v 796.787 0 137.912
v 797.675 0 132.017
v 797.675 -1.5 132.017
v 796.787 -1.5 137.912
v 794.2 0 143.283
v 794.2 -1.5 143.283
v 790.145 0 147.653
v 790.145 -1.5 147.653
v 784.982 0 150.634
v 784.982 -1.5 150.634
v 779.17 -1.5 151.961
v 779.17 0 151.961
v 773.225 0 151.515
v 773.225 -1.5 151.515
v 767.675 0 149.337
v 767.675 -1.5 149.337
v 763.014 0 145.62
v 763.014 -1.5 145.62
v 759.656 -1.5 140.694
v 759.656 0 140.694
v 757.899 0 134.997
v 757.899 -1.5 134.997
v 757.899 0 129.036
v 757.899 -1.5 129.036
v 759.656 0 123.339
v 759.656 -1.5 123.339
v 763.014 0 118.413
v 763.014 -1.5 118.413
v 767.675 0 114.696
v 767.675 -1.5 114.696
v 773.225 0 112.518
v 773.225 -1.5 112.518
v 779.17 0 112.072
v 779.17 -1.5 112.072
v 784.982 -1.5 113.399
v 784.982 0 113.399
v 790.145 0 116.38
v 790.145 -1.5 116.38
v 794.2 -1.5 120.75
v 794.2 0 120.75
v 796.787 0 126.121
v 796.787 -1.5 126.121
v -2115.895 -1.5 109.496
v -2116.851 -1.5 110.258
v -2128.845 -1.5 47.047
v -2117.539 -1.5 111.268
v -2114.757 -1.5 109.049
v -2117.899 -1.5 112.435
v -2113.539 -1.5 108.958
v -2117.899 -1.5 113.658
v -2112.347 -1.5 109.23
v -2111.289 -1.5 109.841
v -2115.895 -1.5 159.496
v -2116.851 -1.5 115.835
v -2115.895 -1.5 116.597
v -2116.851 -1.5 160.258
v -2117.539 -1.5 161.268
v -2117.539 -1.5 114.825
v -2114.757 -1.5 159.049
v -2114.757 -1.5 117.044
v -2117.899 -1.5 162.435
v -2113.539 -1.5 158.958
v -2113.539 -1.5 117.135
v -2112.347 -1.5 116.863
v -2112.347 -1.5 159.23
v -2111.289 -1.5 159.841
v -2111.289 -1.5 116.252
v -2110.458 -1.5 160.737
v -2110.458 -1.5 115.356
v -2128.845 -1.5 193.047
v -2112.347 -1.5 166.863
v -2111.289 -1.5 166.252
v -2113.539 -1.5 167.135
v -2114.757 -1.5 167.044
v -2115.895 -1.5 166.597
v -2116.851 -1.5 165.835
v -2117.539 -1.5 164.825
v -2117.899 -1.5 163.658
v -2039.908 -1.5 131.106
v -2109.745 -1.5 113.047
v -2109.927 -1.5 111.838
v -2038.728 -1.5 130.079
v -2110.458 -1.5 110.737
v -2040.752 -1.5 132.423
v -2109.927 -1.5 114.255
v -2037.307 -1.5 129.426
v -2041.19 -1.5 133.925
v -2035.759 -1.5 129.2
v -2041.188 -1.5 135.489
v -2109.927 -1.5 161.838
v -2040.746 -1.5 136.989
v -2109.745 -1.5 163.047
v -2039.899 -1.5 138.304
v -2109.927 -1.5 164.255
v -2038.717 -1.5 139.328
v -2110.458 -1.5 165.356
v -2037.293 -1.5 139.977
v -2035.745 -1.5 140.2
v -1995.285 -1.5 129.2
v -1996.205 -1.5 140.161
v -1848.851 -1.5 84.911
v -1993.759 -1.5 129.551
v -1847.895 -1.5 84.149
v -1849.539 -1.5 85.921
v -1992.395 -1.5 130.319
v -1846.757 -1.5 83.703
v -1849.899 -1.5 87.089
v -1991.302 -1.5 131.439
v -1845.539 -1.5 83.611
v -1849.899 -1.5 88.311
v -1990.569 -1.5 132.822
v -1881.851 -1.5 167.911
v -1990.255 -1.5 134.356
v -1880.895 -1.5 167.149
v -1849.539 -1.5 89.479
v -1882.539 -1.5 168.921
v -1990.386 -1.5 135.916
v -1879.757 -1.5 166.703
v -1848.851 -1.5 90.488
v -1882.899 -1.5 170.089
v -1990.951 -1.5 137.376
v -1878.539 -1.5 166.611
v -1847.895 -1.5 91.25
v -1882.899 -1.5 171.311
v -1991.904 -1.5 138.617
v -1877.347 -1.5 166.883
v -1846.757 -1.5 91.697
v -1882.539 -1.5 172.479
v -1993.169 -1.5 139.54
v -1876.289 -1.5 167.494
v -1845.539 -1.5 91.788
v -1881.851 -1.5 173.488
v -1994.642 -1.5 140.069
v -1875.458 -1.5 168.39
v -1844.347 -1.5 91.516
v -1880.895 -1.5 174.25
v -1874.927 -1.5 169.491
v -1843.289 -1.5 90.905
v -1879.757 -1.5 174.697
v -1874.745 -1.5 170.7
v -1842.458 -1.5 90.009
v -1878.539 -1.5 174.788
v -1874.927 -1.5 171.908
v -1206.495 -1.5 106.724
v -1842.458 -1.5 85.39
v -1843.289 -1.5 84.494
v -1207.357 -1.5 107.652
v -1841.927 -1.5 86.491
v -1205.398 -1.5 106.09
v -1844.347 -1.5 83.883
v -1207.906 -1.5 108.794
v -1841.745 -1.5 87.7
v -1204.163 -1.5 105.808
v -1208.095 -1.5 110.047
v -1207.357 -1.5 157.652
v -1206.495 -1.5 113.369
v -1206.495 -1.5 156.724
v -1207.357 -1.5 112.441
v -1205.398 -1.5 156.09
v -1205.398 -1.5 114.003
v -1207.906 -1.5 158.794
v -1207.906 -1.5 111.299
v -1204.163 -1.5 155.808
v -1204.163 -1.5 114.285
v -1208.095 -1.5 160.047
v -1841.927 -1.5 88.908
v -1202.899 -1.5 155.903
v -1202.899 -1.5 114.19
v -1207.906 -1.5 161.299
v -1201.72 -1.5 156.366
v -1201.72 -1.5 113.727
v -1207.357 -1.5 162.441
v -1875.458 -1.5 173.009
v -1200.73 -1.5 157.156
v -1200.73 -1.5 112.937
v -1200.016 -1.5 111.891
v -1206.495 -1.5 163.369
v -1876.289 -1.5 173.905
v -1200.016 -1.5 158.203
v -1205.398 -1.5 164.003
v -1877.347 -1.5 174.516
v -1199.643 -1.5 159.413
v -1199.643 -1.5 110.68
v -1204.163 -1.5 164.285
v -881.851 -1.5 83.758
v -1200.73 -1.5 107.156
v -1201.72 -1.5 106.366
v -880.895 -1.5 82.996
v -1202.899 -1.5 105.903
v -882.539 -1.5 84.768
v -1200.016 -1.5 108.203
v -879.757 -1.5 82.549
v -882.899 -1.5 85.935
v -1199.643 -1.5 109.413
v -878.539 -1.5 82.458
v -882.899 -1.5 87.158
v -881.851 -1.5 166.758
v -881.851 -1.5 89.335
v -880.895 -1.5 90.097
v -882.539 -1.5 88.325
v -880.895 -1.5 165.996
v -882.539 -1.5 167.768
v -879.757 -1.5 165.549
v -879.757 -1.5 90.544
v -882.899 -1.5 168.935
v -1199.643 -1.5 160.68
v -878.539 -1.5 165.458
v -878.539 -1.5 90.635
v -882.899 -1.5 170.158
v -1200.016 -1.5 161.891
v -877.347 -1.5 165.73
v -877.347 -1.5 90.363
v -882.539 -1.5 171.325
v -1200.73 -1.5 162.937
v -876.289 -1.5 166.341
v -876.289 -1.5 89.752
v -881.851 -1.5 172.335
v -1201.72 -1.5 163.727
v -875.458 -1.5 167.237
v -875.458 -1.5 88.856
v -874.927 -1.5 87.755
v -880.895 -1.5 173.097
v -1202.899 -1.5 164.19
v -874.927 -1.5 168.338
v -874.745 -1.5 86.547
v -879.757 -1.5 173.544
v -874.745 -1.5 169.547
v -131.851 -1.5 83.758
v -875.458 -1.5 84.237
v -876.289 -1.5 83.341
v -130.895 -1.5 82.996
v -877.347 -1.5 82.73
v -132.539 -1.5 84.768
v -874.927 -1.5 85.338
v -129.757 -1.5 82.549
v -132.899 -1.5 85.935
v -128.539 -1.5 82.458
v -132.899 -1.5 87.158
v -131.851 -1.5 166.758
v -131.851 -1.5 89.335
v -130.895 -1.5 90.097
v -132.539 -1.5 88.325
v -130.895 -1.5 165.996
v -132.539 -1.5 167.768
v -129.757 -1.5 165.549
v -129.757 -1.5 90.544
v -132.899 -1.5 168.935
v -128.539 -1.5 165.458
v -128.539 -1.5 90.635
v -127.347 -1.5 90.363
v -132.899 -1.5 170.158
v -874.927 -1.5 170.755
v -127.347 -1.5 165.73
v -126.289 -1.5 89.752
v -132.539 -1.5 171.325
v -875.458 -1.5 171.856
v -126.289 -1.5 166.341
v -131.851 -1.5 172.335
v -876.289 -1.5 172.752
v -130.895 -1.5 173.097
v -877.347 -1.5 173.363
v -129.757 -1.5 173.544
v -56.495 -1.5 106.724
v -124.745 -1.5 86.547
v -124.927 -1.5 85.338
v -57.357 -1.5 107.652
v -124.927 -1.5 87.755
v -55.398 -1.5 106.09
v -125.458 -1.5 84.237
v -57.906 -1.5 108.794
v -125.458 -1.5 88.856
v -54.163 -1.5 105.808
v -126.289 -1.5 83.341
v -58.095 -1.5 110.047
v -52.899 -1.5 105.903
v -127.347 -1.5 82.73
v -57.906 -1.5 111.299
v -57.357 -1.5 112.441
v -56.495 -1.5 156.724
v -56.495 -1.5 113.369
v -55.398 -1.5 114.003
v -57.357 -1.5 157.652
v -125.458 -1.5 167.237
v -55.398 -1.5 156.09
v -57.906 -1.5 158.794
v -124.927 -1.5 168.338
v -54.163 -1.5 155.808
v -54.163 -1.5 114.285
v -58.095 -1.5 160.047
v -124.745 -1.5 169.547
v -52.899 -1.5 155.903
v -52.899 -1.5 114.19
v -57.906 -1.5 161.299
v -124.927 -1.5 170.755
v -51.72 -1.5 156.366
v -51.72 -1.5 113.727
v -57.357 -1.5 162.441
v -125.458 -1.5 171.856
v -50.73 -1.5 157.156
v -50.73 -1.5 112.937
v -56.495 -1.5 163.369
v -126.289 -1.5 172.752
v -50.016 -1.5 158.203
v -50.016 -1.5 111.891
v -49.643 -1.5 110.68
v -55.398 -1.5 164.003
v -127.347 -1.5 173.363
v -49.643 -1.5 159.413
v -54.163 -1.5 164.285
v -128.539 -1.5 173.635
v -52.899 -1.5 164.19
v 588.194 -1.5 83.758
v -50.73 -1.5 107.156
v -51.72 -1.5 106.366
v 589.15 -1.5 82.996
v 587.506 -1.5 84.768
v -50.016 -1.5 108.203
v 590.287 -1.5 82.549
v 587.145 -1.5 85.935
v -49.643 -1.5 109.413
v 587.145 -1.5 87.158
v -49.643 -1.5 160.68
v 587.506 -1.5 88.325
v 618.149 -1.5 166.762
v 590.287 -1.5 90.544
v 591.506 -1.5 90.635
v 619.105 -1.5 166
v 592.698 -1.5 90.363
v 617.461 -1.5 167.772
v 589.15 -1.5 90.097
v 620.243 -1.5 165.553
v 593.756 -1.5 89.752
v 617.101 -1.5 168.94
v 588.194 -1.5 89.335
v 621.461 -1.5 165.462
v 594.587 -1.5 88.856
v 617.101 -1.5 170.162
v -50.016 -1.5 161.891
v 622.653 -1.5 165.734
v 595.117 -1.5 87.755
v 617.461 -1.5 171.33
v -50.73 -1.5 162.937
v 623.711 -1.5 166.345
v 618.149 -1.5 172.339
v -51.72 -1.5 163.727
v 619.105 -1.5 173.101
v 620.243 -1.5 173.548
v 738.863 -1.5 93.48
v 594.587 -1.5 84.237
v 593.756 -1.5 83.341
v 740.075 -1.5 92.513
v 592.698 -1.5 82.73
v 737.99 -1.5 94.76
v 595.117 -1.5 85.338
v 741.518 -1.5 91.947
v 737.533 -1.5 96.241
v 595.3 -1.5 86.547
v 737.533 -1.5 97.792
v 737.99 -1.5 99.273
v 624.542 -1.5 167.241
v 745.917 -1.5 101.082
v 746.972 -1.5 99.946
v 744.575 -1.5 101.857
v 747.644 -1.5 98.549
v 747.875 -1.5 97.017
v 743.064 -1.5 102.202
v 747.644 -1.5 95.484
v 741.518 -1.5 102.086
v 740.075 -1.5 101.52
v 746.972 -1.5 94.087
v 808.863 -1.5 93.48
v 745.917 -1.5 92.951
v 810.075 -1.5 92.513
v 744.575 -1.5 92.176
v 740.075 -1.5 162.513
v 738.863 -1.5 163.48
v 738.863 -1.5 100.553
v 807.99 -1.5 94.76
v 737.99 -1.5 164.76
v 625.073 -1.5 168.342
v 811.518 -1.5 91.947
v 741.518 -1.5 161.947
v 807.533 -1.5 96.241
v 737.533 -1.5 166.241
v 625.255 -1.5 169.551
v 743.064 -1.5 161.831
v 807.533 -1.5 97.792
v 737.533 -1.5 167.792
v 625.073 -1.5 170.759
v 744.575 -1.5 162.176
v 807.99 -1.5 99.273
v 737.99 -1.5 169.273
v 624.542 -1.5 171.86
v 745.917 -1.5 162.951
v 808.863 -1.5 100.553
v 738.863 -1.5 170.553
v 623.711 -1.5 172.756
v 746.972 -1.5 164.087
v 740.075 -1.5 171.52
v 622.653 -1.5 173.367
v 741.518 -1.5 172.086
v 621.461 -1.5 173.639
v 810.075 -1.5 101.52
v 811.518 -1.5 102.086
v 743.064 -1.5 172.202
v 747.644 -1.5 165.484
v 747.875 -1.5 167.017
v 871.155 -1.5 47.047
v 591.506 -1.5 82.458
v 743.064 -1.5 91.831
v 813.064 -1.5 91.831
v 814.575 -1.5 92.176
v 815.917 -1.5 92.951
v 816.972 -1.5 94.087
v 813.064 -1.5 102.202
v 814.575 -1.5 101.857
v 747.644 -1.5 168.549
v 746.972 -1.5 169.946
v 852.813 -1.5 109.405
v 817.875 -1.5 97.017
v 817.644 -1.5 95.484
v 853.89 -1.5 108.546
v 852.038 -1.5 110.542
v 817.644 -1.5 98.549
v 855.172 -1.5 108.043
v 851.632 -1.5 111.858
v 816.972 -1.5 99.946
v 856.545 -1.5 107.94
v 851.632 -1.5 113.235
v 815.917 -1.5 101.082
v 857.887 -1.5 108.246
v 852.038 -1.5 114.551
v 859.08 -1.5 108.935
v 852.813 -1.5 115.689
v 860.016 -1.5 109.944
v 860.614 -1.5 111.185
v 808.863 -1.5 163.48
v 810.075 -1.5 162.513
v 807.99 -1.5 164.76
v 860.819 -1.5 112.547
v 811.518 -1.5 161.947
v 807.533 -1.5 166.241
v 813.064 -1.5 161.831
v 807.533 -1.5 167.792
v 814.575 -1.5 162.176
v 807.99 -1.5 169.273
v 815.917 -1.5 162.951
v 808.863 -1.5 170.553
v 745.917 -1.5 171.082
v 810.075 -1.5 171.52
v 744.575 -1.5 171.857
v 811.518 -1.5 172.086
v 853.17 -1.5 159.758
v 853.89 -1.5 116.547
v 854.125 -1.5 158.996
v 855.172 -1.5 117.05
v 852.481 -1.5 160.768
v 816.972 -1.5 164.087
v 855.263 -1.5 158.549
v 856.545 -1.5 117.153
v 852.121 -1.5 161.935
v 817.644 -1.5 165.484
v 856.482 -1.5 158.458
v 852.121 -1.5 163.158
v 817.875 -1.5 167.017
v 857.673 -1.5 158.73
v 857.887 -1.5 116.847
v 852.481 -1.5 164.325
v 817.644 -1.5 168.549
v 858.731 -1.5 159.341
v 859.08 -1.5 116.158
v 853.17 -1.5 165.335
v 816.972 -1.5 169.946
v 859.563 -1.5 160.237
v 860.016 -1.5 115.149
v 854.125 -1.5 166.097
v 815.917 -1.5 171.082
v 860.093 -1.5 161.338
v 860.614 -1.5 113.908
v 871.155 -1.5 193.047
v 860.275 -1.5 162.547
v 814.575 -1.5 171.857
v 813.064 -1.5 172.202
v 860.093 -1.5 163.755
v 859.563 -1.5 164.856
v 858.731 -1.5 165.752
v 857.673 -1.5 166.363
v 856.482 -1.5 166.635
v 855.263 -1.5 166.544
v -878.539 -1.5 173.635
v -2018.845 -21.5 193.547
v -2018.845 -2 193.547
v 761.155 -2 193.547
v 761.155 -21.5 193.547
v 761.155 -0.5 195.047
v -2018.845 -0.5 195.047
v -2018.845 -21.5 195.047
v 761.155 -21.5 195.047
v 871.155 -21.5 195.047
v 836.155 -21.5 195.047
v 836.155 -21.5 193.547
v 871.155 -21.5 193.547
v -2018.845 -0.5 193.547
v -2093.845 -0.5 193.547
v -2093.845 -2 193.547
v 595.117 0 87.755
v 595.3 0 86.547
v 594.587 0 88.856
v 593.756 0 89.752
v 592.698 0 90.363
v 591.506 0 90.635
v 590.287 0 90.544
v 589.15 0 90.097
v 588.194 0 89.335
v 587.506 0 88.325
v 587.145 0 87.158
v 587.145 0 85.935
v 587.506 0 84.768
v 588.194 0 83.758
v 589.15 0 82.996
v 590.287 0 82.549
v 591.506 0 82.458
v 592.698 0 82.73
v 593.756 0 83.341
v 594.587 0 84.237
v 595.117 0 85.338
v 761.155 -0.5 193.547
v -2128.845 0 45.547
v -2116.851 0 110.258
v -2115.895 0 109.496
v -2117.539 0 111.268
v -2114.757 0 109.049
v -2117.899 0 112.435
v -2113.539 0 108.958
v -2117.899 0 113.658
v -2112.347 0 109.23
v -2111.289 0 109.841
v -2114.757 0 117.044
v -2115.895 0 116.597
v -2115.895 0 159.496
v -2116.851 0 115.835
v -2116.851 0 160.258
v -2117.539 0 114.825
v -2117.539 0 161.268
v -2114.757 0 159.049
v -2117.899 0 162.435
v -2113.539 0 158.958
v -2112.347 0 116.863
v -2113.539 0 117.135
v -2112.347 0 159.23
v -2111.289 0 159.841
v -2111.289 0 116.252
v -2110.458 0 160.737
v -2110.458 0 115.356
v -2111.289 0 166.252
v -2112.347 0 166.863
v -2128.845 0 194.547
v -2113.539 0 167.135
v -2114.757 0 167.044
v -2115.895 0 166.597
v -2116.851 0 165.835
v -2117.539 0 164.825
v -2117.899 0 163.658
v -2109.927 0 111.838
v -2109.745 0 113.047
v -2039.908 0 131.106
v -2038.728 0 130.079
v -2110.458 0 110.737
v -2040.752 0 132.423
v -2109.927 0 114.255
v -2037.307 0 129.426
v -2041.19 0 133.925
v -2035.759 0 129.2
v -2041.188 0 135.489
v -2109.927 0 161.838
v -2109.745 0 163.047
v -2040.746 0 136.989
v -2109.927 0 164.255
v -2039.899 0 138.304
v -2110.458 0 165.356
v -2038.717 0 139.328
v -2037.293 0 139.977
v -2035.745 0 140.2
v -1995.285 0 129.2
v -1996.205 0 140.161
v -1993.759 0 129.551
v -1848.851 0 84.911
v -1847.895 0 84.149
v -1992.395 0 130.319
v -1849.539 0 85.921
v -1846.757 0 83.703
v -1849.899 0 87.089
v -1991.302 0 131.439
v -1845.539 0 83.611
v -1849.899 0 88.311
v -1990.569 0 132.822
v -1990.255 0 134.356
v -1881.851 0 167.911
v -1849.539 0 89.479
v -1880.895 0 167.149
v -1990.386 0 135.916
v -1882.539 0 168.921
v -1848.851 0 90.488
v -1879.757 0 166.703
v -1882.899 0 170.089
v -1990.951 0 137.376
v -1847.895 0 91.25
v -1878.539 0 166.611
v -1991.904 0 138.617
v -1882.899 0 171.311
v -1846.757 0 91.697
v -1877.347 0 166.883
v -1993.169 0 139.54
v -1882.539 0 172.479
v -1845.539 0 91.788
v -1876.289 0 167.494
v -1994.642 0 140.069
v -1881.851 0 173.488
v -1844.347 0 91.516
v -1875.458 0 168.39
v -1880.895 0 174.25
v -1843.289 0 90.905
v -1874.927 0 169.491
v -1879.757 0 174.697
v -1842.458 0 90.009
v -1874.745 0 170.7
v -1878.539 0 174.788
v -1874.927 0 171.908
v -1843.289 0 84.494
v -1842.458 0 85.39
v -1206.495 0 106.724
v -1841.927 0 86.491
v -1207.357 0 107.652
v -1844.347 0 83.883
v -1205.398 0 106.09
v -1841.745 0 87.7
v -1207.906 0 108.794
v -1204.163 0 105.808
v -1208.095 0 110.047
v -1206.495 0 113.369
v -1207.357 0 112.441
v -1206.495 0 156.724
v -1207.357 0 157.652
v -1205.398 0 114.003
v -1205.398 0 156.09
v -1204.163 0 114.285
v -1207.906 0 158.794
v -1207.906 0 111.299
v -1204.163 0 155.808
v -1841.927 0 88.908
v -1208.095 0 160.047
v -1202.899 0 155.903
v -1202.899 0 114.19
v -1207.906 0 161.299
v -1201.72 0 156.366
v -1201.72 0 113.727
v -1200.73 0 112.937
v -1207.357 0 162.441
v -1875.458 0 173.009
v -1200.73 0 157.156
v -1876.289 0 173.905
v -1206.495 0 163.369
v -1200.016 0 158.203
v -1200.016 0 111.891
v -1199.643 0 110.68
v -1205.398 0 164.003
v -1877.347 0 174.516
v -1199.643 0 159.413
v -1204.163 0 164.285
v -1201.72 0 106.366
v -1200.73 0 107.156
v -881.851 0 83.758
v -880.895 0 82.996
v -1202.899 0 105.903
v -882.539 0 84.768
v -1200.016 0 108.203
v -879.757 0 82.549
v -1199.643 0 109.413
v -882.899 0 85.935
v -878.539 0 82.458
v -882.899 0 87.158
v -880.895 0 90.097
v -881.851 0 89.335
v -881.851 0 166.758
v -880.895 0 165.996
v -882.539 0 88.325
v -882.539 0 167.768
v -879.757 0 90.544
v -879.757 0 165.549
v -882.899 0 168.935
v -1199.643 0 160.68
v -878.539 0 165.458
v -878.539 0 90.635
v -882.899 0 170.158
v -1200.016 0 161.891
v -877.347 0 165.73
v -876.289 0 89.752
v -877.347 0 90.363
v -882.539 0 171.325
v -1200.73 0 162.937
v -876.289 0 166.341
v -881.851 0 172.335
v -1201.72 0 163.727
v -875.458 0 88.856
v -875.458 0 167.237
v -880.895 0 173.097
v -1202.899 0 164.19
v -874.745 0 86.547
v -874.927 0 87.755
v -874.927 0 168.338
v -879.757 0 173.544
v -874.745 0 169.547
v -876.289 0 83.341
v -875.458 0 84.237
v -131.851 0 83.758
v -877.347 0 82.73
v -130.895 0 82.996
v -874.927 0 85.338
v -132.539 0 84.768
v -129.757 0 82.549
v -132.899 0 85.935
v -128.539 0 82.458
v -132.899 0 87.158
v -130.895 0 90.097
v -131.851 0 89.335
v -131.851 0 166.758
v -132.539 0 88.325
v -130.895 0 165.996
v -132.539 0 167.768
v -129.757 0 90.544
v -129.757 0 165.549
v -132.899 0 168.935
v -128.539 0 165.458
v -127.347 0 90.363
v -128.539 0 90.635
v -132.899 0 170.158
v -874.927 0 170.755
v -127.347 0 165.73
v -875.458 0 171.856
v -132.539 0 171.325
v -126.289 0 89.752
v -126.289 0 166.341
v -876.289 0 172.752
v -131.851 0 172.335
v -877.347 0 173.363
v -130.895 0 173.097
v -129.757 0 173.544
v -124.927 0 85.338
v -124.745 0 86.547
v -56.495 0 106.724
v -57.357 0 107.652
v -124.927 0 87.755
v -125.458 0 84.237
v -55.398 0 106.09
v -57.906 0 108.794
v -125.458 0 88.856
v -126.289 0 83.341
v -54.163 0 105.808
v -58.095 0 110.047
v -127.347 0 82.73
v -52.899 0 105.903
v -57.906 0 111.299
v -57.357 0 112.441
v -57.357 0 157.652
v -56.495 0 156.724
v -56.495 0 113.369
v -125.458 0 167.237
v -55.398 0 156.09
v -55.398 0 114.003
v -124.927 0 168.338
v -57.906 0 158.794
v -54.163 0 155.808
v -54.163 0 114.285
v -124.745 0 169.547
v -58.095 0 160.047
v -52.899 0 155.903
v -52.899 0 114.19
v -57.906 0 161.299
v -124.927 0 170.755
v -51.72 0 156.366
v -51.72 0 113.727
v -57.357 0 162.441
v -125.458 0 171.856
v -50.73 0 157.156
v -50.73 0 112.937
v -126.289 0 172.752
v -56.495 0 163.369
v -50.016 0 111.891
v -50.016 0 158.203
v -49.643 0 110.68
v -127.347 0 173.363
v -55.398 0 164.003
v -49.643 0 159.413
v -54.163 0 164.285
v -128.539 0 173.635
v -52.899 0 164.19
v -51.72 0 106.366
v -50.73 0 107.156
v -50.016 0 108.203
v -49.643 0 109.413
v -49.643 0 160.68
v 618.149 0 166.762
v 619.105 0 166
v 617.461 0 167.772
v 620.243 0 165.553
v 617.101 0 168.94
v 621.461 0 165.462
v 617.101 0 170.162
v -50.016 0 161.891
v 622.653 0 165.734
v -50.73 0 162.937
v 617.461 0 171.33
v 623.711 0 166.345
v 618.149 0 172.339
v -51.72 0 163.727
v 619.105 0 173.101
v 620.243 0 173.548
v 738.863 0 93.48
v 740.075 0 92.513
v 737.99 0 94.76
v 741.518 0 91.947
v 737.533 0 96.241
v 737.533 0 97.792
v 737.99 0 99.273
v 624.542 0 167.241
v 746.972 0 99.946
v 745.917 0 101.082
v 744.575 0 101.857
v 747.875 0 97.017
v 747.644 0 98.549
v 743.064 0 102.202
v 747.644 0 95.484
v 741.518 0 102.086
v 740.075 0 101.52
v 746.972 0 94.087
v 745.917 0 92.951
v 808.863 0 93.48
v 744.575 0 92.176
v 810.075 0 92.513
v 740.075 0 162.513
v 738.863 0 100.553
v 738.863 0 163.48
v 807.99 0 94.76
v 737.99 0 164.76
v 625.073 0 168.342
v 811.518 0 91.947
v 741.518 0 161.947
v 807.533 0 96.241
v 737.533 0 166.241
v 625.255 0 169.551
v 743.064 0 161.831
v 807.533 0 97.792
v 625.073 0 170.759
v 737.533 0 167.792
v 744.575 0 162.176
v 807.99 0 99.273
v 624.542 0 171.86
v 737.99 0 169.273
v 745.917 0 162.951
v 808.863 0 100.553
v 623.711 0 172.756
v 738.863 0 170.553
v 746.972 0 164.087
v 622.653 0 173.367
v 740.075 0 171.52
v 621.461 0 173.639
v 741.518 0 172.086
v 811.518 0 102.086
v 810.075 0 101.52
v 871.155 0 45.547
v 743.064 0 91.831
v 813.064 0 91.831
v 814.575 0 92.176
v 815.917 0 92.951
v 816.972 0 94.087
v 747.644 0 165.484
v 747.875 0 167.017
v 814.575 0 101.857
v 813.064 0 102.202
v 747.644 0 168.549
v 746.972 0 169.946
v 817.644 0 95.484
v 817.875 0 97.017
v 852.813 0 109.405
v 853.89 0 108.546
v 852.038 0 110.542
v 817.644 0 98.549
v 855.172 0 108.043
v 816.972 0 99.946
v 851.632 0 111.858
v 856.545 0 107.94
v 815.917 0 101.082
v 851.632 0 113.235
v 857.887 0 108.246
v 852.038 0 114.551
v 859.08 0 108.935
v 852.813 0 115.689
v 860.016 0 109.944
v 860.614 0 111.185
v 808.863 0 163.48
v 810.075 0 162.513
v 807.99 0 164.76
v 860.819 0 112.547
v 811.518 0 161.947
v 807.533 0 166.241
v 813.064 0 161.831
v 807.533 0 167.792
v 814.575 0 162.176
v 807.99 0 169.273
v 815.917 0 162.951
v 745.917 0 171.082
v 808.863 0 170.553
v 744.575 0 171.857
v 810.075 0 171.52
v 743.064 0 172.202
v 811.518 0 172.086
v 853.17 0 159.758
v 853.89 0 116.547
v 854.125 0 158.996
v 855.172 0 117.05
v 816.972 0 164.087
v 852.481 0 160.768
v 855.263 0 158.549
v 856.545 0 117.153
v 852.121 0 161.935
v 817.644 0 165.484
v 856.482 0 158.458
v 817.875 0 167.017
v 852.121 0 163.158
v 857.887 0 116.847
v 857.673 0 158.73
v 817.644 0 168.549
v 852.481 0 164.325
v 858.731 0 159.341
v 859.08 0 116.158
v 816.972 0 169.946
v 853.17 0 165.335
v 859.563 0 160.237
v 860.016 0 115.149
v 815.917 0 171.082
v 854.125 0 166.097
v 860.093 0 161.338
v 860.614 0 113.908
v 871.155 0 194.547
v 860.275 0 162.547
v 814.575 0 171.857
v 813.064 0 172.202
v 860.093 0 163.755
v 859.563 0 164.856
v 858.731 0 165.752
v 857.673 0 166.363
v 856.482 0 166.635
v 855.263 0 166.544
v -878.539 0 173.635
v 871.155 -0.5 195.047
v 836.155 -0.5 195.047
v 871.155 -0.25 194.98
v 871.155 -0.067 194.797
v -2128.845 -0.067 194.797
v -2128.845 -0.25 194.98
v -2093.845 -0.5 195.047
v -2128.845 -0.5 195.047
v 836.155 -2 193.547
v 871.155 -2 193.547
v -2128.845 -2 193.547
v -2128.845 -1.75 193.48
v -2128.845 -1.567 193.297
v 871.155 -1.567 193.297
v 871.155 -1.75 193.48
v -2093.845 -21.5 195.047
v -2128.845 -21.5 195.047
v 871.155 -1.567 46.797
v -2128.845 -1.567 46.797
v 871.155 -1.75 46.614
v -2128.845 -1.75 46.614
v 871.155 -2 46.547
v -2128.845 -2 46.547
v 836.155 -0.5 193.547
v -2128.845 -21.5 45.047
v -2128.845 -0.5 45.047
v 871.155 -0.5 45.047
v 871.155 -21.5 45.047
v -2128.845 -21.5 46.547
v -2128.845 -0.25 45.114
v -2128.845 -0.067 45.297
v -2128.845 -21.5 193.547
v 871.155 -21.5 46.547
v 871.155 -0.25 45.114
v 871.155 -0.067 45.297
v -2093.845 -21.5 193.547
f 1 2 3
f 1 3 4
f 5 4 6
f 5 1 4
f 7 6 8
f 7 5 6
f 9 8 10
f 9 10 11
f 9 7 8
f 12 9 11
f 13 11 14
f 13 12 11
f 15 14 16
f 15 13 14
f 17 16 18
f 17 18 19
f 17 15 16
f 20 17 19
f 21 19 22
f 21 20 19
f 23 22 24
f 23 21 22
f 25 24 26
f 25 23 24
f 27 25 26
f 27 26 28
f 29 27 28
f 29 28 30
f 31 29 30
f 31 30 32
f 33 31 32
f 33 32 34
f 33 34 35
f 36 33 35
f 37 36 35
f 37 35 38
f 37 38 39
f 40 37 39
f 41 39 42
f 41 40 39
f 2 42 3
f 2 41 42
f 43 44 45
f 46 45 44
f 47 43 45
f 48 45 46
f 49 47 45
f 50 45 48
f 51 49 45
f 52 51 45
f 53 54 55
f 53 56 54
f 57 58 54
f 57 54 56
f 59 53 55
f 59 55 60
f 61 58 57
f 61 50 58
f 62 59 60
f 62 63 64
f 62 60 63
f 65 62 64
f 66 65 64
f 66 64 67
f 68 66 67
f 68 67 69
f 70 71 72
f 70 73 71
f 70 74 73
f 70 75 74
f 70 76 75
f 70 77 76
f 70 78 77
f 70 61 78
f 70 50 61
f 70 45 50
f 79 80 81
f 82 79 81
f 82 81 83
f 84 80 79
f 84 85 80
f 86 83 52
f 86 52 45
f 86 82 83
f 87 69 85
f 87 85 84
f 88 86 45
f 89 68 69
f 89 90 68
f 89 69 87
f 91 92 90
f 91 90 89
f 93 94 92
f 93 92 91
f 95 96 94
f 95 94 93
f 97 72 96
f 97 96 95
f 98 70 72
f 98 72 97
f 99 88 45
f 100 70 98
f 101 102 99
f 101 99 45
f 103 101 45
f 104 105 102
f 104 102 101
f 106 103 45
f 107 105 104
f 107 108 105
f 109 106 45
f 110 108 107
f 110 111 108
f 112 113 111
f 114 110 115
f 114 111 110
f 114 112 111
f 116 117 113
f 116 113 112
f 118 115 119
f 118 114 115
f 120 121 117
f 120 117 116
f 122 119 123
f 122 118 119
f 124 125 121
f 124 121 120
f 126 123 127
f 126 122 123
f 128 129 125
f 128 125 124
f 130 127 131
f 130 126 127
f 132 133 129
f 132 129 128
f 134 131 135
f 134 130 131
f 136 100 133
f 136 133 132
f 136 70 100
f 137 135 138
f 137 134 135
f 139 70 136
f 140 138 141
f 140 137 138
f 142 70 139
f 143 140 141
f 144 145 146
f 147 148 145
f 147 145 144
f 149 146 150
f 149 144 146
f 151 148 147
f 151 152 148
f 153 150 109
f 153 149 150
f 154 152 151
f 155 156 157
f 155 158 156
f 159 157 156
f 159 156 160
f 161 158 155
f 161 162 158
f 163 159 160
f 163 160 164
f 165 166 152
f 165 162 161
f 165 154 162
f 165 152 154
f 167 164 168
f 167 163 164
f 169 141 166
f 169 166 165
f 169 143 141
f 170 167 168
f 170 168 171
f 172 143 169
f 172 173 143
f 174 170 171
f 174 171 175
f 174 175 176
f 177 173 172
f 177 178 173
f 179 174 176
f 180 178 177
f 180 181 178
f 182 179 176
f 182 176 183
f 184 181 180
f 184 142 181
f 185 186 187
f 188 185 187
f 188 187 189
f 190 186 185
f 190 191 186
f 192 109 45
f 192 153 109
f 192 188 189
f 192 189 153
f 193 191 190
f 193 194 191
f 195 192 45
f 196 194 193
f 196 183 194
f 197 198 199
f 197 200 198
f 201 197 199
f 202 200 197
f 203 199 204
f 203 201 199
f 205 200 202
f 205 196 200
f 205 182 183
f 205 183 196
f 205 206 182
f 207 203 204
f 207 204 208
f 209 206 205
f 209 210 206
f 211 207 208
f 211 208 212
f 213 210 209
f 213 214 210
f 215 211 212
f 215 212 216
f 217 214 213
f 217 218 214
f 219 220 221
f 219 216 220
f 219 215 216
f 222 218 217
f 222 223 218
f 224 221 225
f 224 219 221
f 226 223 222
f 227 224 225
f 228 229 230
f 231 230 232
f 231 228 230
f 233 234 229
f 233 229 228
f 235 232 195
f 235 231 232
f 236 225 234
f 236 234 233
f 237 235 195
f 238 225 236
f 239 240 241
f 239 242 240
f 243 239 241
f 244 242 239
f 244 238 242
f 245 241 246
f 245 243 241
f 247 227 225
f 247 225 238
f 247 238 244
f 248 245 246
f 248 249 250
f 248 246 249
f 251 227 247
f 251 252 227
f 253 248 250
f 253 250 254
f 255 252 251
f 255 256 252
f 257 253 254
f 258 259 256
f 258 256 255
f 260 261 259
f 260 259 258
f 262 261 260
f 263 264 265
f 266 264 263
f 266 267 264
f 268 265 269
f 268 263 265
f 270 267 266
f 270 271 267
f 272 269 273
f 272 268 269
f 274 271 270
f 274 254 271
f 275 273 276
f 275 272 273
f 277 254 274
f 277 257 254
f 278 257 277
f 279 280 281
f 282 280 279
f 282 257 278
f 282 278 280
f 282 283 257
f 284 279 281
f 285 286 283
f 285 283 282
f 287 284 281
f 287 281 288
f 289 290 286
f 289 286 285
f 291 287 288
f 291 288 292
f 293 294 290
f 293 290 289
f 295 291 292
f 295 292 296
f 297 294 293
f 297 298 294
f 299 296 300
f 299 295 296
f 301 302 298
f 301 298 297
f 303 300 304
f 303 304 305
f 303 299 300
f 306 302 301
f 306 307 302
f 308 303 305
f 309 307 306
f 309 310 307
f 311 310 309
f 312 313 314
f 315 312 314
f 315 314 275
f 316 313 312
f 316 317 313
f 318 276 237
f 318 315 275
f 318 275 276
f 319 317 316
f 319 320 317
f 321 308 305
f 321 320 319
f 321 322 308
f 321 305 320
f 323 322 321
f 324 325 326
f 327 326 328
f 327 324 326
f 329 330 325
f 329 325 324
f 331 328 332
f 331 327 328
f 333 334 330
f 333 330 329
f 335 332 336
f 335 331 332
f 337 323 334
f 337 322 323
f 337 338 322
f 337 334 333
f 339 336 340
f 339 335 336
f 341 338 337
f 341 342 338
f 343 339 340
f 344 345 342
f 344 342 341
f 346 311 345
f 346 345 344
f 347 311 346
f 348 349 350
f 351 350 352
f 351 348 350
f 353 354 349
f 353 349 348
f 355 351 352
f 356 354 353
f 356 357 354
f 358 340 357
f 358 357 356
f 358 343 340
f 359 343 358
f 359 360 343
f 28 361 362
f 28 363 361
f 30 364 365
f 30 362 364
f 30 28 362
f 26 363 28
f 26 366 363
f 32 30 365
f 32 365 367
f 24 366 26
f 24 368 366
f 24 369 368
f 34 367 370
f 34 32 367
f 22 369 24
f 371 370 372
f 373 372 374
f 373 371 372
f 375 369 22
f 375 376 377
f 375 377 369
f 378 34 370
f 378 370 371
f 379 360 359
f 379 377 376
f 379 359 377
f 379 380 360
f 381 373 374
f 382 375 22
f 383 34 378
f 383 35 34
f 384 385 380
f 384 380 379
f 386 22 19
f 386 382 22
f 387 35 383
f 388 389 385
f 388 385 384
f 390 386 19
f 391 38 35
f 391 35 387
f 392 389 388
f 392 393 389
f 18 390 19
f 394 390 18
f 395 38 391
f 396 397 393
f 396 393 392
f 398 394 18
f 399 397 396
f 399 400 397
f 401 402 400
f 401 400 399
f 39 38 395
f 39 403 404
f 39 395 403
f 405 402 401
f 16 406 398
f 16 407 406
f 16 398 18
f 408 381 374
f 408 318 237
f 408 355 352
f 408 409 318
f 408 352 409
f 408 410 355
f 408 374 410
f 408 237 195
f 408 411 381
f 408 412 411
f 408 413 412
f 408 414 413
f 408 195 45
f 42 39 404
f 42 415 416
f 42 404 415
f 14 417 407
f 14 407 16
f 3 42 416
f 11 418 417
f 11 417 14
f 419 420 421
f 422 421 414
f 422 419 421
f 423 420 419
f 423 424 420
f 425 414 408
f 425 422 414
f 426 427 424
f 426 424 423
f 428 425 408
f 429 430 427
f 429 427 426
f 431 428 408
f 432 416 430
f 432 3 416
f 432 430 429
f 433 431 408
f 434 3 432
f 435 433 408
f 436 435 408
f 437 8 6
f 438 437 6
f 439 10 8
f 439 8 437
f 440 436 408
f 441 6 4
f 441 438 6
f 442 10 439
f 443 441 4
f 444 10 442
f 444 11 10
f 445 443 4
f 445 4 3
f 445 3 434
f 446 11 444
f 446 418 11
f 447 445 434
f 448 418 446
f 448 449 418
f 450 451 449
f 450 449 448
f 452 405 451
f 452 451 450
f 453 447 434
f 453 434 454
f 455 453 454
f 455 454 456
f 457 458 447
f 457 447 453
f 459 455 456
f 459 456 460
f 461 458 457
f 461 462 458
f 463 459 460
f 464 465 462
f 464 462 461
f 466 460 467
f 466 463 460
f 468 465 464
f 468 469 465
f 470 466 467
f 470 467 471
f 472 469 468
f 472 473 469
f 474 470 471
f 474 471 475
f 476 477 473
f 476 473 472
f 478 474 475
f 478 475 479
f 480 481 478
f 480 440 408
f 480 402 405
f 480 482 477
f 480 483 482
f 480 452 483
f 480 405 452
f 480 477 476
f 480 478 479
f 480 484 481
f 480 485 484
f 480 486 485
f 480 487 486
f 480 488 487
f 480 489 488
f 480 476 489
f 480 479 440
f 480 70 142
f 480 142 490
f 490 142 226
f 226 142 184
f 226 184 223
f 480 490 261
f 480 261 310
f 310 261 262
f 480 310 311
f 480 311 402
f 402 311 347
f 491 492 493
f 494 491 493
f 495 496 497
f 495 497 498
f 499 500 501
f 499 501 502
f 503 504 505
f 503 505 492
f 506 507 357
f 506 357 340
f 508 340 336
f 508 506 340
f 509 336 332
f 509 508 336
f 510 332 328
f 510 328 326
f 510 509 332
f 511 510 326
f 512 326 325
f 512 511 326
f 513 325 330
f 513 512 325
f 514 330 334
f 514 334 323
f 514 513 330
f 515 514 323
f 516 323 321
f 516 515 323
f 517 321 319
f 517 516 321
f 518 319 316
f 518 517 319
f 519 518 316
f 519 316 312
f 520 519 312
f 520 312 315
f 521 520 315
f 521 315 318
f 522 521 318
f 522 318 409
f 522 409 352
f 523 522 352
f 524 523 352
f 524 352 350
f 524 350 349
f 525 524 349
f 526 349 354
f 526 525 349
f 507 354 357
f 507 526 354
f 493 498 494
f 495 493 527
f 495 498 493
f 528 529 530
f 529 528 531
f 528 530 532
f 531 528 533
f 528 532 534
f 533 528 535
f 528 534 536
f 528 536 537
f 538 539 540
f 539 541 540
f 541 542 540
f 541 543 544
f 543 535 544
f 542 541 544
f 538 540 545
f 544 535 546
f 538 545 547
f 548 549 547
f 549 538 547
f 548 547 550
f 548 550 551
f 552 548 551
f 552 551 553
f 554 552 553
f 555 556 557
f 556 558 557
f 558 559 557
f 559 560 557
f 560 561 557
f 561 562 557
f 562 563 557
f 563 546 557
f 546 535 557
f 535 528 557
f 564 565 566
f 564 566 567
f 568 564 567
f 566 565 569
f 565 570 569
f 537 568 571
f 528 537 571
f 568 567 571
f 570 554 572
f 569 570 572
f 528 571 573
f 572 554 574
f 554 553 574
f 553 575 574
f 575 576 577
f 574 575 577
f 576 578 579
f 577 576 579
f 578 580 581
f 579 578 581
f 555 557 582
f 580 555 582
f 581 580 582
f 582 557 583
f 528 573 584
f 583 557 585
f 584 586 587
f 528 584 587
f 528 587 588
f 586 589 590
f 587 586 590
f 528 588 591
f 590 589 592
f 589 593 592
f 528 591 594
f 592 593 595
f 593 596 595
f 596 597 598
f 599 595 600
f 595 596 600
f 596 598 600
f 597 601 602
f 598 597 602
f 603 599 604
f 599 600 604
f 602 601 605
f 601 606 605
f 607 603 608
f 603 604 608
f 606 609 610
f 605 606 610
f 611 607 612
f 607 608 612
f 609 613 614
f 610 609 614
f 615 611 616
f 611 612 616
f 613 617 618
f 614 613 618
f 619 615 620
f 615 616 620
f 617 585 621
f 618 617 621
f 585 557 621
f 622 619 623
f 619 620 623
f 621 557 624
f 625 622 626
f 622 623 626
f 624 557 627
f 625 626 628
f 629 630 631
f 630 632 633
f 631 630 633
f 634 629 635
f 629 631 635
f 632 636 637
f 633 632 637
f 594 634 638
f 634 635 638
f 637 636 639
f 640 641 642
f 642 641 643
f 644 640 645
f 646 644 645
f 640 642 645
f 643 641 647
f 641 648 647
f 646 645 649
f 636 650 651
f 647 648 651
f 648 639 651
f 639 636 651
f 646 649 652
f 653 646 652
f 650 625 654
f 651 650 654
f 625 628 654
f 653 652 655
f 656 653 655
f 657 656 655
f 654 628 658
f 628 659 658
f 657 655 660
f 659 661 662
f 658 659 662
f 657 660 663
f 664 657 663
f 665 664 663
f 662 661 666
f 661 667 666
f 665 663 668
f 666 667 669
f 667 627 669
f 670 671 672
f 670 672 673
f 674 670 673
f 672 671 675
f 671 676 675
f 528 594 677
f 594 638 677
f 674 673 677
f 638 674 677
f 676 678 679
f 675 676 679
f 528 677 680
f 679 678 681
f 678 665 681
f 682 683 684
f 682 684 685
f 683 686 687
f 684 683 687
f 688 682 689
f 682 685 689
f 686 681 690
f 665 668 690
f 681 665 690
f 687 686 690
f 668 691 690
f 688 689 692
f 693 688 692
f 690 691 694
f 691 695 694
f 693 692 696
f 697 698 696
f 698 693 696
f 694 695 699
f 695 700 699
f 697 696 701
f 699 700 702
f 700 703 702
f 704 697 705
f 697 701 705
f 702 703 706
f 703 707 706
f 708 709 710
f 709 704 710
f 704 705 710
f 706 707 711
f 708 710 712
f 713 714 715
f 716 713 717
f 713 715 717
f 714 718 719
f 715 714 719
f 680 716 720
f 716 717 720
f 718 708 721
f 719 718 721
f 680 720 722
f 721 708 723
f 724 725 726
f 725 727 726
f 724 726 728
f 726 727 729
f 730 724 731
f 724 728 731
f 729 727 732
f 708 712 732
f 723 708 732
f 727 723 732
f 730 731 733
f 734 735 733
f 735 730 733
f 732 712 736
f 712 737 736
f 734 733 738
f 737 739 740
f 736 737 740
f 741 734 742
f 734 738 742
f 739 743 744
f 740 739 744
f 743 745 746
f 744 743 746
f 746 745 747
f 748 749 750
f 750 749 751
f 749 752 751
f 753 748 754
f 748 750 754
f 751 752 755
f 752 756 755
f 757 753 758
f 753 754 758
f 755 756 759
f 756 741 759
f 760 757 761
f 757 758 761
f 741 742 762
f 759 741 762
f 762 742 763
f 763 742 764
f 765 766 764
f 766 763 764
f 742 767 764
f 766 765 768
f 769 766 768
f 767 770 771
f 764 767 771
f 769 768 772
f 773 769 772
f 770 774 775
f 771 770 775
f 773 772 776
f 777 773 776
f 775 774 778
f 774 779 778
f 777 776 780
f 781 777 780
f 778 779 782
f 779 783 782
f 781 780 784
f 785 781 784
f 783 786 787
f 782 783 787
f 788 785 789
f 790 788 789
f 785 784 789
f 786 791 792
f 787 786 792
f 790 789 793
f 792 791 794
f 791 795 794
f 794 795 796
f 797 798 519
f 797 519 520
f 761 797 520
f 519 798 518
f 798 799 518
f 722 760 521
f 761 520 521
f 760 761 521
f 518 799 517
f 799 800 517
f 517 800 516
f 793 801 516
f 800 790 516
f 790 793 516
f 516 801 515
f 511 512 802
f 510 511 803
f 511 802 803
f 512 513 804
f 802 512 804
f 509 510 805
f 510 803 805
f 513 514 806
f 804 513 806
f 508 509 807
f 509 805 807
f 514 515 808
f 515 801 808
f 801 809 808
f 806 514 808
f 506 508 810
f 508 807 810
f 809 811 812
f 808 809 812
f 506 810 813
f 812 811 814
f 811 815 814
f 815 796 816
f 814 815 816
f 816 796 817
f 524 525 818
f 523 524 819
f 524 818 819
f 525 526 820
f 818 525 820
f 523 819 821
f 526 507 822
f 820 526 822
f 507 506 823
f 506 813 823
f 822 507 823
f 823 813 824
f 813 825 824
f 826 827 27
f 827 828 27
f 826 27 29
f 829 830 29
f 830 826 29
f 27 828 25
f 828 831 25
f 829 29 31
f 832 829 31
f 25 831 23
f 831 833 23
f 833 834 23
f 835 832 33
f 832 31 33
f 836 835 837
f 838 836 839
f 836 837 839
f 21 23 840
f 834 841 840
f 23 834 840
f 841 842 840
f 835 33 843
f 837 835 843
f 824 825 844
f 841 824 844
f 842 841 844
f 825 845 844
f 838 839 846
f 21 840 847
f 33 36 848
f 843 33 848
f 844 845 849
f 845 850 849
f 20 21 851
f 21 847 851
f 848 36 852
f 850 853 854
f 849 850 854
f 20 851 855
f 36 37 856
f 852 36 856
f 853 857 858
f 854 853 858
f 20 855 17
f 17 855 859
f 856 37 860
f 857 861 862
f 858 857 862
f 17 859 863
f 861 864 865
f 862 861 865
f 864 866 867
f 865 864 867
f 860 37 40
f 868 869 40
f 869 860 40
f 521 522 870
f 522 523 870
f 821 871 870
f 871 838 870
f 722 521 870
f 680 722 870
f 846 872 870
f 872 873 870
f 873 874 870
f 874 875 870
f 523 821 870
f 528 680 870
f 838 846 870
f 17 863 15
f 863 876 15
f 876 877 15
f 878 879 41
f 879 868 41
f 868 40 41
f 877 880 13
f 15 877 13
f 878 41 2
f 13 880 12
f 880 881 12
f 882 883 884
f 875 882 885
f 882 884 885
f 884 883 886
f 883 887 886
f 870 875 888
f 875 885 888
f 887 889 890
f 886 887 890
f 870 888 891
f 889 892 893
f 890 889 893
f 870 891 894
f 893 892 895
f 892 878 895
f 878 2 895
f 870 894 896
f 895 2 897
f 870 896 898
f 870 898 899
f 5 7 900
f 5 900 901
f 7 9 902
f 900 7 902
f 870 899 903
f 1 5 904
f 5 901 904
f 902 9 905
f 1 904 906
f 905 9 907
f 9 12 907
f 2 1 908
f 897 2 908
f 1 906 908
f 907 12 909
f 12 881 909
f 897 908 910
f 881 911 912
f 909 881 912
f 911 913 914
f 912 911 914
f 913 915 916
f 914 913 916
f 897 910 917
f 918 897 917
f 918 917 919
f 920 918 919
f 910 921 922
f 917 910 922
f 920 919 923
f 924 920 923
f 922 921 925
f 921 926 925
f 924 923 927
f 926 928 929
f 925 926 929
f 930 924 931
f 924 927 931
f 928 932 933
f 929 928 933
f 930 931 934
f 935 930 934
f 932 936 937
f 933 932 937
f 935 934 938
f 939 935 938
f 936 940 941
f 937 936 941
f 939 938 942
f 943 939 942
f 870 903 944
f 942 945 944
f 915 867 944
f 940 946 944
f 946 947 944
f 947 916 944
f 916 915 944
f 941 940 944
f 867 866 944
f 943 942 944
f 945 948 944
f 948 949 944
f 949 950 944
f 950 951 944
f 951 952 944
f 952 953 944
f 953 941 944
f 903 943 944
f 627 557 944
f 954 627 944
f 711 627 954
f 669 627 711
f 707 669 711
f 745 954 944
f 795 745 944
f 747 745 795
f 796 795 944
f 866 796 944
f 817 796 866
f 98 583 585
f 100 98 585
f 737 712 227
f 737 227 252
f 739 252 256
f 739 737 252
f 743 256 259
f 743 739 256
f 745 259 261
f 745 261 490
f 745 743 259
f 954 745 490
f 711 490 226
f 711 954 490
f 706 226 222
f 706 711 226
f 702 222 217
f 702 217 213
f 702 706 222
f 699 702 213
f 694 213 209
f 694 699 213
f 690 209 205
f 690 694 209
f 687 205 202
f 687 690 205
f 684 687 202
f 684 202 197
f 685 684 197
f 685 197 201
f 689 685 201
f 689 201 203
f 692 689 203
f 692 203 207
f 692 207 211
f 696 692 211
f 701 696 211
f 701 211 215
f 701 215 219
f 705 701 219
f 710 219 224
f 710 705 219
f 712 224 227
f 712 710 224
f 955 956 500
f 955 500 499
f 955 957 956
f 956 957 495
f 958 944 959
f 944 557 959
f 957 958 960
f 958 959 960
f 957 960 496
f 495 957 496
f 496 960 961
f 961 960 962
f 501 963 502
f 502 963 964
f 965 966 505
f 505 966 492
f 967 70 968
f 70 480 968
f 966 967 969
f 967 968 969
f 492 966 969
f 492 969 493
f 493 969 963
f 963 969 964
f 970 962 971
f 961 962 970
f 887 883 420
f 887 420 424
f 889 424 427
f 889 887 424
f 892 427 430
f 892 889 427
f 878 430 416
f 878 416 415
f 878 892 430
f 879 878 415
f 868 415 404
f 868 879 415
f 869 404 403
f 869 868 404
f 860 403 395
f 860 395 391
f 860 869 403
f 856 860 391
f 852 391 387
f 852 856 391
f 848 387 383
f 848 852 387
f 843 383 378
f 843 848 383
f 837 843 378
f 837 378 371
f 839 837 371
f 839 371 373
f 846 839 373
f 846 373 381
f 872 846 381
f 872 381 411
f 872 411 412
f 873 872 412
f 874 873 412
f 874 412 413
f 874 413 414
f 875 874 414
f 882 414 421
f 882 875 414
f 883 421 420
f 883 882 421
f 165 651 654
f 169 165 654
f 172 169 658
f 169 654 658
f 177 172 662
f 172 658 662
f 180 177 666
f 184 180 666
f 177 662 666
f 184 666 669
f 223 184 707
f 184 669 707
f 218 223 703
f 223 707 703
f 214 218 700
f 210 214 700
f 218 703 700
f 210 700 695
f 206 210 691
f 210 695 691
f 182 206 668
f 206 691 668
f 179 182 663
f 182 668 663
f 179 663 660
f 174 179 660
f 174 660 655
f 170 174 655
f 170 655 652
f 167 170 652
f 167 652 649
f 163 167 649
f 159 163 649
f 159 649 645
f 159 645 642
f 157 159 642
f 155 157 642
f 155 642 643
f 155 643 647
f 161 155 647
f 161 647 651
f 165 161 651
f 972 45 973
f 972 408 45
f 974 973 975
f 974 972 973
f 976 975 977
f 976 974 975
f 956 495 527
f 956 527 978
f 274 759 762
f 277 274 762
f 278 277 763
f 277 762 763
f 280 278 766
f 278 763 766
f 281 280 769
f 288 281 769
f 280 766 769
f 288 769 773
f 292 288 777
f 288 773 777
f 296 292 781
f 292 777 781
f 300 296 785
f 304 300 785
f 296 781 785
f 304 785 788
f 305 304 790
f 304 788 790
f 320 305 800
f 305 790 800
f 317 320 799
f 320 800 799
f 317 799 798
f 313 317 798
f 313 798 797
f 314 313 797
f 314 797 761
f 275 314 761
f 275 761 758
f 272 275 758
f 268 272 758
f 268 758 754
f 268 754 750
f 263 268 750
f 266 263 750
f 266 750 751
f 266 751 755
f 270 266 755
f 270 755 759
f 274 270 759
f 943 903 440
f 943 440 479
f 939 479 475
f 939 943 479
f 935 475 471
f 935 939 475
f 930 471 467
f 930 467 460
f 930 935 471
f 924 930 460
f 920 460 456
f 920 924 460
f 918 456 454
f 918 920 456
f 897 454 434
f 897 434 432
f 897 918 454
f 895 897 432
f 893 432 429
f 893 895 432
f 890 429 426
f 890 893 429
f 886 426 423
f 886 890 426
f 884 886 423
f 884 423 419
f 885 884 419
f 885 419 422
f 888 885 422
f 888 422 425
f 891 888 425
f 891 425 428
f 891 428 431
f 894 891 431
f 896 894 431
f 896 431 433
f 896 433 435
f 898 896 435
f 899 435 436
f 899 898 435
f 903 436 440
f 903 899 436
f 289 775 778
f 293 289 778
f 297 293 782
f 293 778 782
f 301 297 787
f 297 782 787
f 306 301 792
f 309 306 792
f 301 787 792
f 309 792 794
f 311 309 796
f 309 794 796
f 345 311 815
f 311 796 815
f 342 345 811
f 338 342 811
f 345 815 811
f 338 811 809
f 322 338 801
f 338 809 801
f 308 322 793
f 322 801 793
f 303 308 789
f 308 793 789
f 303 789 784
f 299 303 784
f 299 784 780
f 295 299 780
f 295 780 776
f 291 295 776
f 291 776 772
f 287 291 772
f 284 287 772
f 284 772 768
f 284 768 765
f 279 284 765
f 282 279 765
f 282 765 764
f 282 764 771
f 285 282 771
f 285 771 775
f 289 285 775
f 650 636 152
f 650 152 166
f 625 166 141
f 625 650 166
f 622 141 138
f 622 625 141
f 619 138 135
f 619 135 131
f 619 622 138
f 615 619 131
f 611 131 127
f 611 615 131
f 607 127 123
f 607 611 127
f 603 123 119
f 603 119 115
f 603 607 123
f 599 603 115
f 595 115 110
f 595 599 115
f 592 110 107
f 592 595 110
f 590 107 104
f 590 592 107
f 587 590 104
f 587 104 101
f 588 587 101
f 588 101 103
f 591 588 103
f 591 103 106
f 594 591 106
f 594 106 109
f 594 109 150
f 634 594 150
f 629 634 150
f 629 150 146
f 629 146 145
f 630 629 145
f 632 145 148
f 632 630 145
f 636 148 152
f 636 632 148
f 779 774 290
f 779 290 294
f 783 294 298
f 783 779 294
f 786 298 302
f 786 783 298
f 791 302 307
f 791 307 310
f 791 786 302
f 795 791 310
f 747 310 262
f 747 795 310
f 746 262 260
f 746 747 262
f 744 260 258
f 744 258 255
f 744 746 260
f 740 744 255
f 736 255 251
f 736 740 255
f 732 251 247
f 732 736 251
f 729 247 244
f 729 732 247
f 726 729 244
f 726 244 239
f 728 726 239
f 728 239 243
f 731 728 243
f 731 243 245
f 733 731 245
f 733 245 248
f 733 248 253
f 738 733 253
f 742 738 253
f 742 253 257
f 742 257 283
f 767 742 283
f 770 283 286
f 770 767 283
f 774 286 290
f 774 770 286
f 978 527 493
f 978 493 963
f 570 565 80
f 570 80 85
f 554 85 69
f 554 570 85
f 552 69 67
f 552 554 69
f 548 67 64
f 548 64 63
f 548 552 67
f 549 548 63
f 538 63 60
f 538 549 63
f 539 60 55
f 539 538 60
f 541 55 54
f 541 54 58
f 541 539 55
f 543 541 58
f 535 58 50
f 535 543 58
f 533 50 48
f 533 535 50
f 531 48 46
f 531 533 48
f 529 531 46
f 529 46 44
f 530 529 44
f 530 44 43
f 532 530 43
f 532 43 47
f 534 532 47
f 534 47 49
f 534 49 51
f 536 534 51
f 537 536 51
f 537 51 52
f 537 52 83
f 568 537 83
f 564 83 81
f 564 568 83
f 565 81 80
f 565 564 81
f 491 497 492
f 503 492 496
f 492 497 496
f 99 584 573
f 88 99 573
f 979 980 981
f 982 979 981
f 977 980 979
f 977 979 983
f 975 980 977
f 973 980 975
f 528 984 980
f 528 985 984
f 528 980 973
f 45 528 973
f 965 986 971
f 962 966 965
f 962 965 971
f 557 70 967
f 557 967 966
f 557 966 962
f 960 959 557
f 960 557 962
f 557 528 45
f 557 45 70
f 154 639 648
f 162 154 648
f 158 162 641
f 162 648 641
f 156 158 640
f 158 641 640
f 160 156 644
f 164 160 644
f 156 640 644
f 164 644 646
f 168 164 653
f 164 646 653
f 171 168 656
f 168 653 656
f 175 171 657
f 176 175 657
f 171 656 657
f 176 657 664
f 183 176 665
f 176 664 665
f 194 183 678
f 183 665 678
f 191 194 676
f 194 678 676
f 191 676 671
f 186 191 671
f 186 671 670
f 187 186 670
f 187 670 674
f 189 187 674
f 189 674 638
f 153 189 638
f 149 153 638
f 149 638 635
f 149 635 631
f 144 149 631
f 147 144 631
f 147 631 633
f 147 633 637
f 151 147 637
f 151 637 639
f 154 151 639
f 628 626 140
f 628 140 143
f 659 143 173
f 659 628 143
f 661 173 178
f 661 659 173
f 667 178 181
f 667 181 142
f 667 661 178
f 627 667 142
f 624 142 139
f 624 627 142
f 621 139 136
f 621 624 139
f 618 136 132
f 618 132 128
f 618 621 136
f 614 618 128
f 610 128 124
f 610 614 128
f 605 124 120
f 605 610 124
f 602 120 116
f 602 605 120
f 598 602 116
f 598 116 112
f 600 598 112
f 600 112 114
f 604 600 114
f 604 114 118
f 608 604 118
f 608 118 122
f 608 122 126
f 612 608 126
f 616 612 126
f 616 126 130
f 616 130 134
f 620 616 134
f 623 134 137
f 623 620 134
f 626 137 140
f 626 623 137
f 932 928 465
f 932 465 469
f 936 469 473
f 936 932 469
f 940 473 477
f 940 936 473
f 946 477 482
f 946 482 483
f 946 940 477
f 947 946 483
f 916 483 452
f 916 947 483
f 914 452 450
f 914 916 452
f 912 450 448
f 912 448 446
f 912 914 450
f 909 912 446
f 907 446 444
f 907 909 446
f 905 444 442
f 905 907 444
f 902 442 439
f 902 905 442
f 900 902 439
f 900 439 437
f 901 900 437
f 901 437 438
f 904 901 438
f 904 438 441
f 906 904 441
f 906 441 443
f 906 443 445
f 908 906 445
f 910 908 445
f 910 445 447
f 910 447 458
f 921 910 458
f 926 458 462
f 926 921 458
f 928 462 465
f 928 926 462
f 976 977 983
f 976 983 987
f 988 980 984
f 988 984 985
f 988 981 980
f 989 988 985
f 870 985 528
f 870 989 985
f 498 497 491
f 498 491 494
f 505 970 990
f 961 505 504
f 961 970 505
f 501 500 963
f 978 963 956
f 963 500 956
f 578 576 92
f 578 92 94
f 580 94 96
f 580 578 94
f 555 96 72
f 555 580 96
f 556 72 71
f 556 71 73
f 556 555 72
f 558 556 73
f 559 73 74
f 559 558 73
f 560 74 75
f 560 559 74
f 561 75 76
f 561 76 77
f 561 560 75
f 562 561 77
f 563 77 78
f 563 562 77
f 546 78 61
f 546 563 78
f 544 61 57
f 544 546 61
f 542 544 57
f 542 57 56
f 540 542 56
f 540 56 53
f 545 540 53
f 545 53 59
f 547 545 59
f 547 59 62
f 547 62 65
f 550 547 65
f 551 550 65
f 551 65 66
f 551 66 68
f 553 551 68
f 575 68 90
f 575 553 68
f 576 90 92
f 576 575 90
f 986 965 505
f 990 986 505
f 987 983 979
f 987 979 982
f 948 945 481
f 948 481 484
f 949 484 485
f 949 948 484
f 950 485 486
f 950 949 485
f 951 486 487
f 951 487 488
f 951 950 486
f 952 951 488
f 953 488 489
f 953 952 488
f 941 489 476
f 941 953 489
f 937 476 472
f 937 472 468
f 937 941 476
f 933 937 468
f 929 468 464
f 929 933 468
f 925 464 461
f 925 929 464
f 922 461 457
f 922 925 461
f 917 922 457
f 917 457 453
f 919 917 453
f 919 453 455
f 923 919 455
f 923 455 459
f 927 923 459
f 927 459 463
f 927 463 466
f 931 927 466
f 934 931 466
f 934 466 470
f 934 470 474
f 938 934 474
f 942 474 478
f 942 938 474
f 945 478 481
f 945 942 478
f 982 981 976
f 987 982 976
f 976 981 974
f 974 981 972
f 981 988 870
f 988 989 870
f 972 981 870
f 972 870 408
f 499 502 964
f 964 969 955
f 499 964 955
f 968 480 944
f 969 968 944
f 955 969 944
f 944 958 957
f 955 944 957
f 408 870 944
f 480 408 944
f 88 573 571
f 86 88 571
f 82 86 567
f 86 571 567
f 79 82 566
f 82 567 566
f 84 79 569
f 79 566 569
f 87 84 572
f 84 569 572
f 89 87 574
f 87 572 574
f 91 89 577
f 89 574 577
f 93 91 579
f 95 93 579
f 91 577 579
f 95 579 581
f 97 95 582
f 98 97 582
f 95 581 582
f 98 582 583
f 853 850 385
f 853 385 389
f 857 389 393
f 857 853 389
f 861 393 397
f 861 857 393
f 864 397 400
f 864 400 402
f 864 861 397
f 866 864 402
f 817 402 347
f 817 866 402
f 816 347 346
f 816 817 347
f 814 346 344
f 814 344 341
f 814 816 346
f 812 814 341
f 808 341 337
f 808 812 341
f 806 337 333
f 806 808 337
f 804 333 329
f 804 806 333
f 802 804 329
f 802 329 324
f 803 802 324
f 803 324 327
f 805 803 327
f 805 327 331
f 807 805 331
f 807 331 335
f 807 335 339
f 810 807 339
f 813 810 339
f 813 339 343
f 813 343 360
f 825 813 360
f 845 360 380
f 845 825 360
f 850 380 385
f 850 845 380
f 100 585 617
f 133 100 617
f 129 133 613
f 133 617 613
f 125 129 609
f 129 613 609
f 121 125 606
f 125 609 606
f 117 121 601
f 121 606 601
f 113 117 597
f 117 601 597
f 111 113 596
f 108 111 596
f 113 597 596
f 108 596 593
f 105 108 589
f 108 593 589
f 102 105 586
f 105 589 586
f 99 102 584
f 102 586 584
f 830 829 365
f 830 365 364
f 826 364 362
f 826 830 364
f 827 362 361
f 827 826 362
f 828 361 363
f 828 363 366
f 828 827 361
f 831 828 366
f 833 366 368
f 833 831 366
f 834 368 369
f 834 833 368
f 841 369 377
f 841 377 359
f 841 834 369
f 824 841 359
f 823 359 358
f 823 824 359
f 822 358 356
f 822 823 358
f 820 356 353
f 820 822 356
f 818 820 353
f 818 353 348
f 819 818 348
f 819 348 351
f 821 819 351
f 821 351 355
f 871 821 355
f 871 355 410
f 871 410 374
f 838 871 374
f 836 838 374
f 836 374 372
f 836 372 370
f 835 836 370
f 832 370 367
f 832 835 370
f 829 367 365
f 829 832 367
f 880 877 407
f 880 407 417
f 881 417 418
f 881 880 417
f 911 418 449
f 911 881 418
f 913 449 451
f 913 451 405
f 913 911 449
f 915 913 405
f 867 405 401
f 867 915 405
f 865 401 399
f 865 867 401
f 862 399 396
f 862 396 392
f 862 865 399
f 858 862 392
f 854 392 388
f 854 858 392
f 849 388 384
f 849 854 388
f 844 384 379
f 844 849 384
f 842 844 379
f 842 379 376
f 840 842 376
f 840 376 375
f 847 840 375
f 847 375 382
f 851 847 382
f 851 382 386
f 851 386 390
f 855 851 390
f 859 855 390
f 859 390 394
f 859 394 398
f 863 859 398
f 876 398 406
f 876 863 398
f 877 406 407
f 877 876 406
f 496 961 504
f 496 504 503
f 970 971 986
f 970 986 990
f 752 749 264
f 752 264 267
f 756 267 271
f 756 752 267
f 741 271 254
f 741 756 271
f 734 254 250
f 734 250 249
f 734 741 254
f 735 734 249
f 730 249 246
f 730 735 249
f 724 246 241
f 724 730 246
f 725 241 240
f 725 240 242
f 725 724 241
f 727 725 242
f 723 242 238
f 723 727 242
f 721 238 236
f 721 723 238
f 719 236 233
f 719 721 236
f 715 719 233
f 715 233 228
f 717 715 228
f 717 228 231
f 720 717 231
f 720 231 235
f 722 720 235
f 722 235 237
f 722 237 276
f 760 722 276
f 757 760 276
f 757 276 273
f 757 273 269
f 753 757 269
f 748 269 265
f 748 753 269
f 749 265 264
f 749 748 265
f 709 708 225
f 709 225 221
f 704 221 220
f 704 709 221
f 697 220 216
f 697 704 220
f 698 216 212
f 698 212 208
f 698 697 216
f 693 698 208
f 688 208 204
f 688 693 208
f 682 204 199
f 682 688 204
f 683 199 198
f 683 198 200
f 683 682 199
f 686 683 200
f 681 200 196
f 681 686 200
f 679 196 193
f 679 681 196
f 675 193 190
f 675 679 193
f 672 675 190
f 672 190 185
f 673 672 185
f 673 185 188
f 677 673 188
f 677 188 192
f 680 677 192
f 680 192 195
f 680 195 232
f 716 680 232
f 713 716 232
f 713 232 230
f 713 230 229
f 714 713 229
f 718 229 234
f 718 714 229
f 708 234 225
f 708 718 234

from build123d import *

# Parameters (mm, degrees)
F0_R     = 4.1
F0_R_2   = 5.2
F0_R_3   = 4.619431
F0_R_4   = 20
F1_DEPTH = 1.5
F2_W     = 3000
F2_H     = 1.5
F3_DEPTH = 20
F4_R     = 0.5
F5_R     = 4.25
F6_DEPTH = 21.501
F7_W     = 75
F7_H     = 21
F8_DEPTH = 1.5


with BuildPart() as f1:
    # F0 (on Front) → F1 (new body)
    with BuildSketch(Plane.XZ):
        Polygon((871.154863, 195.046515), (-1128.845137, 195.046515), (-2128.845137, 195.046515), (-2128.845137, 169.890946), (-2128.845137, 45.046515), (-1128.845137, 45.046515), (871.154863, 45.046515), align=None)
        with Locations((-1845.845137, 87.699787)):
            Circle(F0_R, mode=Mode.SUBTRACT)
        with Locations((-2113.845137, 113.046515)):
            Circle(F0_R, mode=Mode.SUBTRACT)
        with Locations((-878.845137, 86.546515)):
            Circle(F0_R, mode=Mode.SUBTRACT)
        with Locations((-128.845137, 86.546515)):
            Circle(F0_R, mode=Mode.SUBTRACT)
        with Locations((591.199606, 86.546515)):
            Circle(F0_R, mode=Mode.SUBTRACT)
        with Locations((742.675182, 97.016515)):
            Circle(F0_R_2, mode=Mode.SUBTRACT)
        with Locations((812.675182, 97.016515)):
            Circle(F0_R_2, mode=Mode.SUBTRACT)
        with Locations((856.199606, 112.546515)):
            Circle(F0_R_3, mode=Mode.SUBTRACT)
        with BuildLine():
            ThreePointArc((-1996.204941, 140.161261), (-1990.264413, 135.140534), (-1995.284902, 129.199805))
            Line((-1995.284902, 129.199805), (-2035.758988, 129.199805))
            ThreePointArc((-2035.758988, 129.199805), (-2041.245133, 134.706713), (-2035.745137, 140.199787))
            Line((-2035.745137, 140.199787), (-1996.204941, 140.161261))
        make_face(mode=Mode.SUBTRACT)
        with Locations((-2113.845137, 163.046515)):
            Circle(F0_R, mode=Mode.SUBTRACT)
        with Locations((-1878.845137, 170.699787)):
            Circle(F0_R, mode=Mode.SUBTRACT)
        with Locations((-878.845137, 169.546515)):
            Circle(F0_R, mode=Mode.SUBTRACT)
        with Locations((777.675182, 132.016515)):
            Circle(F0_R_4, mode=Mode.SUBTRACT)
        with Locations((-128.845137, 169.546515)):
            Circle(F0_R, mode=Mode.SUBTRACT)
        with Locations((856.175182, 162.546515)):
            Circle(F0_R, mode=Mode.SUBTRACT)
        with Locations((621.154863, 169.550618)):
            Circle(F0_R, mode=Mode.SUBTRACT)
        with Locations((742.675182, 167.016515)):
            Circle(F0_R_2, mode=Mode.SUBTRACT)
        with Locations((812.675182, 167.016515)):
            Circle(F0_R_2, mode=Mode.SUBTRACT)
    extrude(amount=F1_DEPTH)

    # F2 (on face) → F3 (join)
    with BuildSketch(Plane.XZ.offset(1.5)):
        with Locations((-628.845137, 194.296515)):
            Rectangle(F2_W, F2_H)
        with Locations((-628.845137, 45.796515)):
            Rectangle(F2_W, F2_H)
    extrude(amount=F3_DEPTH)

    # F4
    f4_edges = [f1.edges().sort_by_distance(p)[0] for p in [
        (-628.845137, -1.5, 193.546515),
        (-628.845137, 0, 45.046515),
        (-628.845137, -1.5, 46.546515),
        (-628.845137, 0, 195.046515),
    ]]
    fillet(f4_edges, radius=F4_R)

    # F5 (on face) → F6 (cut, through all)
    with BuildSketch(Plane(origin=(0, 0, 0), x_dir=(-1, 0, 0), z_dir=(0, 1, 0))):
        with Locations((1203.845137, 160.046515)):
            Circle(F5_R)
        with Locations((1203.845137, 110.046515)):
            Circle(F5_R)
        with Locations((53.845137, 160.046515)):
            Circle(F5_R)
        with Locations((53.845137, 110.046515)):
            Circle(F5_R)
    extrude(amount=-F6_DEPTH, mode=Mode.SUBTRACT)

    # F7 (on face) → F8 (cut)
    with BuildSketch(Plane.XY.offset(195.046515)):
        with Locations((798.654863, -11)):
            Rectangle(F7_W, F7_H)
        with Locations((-2056.345137, -11)):
            Rectangle(F7_W, F7_H)
    extrude(amount=-F8_DEPTH, mode=Mode.SUBTRACT)


solid = f1.part
